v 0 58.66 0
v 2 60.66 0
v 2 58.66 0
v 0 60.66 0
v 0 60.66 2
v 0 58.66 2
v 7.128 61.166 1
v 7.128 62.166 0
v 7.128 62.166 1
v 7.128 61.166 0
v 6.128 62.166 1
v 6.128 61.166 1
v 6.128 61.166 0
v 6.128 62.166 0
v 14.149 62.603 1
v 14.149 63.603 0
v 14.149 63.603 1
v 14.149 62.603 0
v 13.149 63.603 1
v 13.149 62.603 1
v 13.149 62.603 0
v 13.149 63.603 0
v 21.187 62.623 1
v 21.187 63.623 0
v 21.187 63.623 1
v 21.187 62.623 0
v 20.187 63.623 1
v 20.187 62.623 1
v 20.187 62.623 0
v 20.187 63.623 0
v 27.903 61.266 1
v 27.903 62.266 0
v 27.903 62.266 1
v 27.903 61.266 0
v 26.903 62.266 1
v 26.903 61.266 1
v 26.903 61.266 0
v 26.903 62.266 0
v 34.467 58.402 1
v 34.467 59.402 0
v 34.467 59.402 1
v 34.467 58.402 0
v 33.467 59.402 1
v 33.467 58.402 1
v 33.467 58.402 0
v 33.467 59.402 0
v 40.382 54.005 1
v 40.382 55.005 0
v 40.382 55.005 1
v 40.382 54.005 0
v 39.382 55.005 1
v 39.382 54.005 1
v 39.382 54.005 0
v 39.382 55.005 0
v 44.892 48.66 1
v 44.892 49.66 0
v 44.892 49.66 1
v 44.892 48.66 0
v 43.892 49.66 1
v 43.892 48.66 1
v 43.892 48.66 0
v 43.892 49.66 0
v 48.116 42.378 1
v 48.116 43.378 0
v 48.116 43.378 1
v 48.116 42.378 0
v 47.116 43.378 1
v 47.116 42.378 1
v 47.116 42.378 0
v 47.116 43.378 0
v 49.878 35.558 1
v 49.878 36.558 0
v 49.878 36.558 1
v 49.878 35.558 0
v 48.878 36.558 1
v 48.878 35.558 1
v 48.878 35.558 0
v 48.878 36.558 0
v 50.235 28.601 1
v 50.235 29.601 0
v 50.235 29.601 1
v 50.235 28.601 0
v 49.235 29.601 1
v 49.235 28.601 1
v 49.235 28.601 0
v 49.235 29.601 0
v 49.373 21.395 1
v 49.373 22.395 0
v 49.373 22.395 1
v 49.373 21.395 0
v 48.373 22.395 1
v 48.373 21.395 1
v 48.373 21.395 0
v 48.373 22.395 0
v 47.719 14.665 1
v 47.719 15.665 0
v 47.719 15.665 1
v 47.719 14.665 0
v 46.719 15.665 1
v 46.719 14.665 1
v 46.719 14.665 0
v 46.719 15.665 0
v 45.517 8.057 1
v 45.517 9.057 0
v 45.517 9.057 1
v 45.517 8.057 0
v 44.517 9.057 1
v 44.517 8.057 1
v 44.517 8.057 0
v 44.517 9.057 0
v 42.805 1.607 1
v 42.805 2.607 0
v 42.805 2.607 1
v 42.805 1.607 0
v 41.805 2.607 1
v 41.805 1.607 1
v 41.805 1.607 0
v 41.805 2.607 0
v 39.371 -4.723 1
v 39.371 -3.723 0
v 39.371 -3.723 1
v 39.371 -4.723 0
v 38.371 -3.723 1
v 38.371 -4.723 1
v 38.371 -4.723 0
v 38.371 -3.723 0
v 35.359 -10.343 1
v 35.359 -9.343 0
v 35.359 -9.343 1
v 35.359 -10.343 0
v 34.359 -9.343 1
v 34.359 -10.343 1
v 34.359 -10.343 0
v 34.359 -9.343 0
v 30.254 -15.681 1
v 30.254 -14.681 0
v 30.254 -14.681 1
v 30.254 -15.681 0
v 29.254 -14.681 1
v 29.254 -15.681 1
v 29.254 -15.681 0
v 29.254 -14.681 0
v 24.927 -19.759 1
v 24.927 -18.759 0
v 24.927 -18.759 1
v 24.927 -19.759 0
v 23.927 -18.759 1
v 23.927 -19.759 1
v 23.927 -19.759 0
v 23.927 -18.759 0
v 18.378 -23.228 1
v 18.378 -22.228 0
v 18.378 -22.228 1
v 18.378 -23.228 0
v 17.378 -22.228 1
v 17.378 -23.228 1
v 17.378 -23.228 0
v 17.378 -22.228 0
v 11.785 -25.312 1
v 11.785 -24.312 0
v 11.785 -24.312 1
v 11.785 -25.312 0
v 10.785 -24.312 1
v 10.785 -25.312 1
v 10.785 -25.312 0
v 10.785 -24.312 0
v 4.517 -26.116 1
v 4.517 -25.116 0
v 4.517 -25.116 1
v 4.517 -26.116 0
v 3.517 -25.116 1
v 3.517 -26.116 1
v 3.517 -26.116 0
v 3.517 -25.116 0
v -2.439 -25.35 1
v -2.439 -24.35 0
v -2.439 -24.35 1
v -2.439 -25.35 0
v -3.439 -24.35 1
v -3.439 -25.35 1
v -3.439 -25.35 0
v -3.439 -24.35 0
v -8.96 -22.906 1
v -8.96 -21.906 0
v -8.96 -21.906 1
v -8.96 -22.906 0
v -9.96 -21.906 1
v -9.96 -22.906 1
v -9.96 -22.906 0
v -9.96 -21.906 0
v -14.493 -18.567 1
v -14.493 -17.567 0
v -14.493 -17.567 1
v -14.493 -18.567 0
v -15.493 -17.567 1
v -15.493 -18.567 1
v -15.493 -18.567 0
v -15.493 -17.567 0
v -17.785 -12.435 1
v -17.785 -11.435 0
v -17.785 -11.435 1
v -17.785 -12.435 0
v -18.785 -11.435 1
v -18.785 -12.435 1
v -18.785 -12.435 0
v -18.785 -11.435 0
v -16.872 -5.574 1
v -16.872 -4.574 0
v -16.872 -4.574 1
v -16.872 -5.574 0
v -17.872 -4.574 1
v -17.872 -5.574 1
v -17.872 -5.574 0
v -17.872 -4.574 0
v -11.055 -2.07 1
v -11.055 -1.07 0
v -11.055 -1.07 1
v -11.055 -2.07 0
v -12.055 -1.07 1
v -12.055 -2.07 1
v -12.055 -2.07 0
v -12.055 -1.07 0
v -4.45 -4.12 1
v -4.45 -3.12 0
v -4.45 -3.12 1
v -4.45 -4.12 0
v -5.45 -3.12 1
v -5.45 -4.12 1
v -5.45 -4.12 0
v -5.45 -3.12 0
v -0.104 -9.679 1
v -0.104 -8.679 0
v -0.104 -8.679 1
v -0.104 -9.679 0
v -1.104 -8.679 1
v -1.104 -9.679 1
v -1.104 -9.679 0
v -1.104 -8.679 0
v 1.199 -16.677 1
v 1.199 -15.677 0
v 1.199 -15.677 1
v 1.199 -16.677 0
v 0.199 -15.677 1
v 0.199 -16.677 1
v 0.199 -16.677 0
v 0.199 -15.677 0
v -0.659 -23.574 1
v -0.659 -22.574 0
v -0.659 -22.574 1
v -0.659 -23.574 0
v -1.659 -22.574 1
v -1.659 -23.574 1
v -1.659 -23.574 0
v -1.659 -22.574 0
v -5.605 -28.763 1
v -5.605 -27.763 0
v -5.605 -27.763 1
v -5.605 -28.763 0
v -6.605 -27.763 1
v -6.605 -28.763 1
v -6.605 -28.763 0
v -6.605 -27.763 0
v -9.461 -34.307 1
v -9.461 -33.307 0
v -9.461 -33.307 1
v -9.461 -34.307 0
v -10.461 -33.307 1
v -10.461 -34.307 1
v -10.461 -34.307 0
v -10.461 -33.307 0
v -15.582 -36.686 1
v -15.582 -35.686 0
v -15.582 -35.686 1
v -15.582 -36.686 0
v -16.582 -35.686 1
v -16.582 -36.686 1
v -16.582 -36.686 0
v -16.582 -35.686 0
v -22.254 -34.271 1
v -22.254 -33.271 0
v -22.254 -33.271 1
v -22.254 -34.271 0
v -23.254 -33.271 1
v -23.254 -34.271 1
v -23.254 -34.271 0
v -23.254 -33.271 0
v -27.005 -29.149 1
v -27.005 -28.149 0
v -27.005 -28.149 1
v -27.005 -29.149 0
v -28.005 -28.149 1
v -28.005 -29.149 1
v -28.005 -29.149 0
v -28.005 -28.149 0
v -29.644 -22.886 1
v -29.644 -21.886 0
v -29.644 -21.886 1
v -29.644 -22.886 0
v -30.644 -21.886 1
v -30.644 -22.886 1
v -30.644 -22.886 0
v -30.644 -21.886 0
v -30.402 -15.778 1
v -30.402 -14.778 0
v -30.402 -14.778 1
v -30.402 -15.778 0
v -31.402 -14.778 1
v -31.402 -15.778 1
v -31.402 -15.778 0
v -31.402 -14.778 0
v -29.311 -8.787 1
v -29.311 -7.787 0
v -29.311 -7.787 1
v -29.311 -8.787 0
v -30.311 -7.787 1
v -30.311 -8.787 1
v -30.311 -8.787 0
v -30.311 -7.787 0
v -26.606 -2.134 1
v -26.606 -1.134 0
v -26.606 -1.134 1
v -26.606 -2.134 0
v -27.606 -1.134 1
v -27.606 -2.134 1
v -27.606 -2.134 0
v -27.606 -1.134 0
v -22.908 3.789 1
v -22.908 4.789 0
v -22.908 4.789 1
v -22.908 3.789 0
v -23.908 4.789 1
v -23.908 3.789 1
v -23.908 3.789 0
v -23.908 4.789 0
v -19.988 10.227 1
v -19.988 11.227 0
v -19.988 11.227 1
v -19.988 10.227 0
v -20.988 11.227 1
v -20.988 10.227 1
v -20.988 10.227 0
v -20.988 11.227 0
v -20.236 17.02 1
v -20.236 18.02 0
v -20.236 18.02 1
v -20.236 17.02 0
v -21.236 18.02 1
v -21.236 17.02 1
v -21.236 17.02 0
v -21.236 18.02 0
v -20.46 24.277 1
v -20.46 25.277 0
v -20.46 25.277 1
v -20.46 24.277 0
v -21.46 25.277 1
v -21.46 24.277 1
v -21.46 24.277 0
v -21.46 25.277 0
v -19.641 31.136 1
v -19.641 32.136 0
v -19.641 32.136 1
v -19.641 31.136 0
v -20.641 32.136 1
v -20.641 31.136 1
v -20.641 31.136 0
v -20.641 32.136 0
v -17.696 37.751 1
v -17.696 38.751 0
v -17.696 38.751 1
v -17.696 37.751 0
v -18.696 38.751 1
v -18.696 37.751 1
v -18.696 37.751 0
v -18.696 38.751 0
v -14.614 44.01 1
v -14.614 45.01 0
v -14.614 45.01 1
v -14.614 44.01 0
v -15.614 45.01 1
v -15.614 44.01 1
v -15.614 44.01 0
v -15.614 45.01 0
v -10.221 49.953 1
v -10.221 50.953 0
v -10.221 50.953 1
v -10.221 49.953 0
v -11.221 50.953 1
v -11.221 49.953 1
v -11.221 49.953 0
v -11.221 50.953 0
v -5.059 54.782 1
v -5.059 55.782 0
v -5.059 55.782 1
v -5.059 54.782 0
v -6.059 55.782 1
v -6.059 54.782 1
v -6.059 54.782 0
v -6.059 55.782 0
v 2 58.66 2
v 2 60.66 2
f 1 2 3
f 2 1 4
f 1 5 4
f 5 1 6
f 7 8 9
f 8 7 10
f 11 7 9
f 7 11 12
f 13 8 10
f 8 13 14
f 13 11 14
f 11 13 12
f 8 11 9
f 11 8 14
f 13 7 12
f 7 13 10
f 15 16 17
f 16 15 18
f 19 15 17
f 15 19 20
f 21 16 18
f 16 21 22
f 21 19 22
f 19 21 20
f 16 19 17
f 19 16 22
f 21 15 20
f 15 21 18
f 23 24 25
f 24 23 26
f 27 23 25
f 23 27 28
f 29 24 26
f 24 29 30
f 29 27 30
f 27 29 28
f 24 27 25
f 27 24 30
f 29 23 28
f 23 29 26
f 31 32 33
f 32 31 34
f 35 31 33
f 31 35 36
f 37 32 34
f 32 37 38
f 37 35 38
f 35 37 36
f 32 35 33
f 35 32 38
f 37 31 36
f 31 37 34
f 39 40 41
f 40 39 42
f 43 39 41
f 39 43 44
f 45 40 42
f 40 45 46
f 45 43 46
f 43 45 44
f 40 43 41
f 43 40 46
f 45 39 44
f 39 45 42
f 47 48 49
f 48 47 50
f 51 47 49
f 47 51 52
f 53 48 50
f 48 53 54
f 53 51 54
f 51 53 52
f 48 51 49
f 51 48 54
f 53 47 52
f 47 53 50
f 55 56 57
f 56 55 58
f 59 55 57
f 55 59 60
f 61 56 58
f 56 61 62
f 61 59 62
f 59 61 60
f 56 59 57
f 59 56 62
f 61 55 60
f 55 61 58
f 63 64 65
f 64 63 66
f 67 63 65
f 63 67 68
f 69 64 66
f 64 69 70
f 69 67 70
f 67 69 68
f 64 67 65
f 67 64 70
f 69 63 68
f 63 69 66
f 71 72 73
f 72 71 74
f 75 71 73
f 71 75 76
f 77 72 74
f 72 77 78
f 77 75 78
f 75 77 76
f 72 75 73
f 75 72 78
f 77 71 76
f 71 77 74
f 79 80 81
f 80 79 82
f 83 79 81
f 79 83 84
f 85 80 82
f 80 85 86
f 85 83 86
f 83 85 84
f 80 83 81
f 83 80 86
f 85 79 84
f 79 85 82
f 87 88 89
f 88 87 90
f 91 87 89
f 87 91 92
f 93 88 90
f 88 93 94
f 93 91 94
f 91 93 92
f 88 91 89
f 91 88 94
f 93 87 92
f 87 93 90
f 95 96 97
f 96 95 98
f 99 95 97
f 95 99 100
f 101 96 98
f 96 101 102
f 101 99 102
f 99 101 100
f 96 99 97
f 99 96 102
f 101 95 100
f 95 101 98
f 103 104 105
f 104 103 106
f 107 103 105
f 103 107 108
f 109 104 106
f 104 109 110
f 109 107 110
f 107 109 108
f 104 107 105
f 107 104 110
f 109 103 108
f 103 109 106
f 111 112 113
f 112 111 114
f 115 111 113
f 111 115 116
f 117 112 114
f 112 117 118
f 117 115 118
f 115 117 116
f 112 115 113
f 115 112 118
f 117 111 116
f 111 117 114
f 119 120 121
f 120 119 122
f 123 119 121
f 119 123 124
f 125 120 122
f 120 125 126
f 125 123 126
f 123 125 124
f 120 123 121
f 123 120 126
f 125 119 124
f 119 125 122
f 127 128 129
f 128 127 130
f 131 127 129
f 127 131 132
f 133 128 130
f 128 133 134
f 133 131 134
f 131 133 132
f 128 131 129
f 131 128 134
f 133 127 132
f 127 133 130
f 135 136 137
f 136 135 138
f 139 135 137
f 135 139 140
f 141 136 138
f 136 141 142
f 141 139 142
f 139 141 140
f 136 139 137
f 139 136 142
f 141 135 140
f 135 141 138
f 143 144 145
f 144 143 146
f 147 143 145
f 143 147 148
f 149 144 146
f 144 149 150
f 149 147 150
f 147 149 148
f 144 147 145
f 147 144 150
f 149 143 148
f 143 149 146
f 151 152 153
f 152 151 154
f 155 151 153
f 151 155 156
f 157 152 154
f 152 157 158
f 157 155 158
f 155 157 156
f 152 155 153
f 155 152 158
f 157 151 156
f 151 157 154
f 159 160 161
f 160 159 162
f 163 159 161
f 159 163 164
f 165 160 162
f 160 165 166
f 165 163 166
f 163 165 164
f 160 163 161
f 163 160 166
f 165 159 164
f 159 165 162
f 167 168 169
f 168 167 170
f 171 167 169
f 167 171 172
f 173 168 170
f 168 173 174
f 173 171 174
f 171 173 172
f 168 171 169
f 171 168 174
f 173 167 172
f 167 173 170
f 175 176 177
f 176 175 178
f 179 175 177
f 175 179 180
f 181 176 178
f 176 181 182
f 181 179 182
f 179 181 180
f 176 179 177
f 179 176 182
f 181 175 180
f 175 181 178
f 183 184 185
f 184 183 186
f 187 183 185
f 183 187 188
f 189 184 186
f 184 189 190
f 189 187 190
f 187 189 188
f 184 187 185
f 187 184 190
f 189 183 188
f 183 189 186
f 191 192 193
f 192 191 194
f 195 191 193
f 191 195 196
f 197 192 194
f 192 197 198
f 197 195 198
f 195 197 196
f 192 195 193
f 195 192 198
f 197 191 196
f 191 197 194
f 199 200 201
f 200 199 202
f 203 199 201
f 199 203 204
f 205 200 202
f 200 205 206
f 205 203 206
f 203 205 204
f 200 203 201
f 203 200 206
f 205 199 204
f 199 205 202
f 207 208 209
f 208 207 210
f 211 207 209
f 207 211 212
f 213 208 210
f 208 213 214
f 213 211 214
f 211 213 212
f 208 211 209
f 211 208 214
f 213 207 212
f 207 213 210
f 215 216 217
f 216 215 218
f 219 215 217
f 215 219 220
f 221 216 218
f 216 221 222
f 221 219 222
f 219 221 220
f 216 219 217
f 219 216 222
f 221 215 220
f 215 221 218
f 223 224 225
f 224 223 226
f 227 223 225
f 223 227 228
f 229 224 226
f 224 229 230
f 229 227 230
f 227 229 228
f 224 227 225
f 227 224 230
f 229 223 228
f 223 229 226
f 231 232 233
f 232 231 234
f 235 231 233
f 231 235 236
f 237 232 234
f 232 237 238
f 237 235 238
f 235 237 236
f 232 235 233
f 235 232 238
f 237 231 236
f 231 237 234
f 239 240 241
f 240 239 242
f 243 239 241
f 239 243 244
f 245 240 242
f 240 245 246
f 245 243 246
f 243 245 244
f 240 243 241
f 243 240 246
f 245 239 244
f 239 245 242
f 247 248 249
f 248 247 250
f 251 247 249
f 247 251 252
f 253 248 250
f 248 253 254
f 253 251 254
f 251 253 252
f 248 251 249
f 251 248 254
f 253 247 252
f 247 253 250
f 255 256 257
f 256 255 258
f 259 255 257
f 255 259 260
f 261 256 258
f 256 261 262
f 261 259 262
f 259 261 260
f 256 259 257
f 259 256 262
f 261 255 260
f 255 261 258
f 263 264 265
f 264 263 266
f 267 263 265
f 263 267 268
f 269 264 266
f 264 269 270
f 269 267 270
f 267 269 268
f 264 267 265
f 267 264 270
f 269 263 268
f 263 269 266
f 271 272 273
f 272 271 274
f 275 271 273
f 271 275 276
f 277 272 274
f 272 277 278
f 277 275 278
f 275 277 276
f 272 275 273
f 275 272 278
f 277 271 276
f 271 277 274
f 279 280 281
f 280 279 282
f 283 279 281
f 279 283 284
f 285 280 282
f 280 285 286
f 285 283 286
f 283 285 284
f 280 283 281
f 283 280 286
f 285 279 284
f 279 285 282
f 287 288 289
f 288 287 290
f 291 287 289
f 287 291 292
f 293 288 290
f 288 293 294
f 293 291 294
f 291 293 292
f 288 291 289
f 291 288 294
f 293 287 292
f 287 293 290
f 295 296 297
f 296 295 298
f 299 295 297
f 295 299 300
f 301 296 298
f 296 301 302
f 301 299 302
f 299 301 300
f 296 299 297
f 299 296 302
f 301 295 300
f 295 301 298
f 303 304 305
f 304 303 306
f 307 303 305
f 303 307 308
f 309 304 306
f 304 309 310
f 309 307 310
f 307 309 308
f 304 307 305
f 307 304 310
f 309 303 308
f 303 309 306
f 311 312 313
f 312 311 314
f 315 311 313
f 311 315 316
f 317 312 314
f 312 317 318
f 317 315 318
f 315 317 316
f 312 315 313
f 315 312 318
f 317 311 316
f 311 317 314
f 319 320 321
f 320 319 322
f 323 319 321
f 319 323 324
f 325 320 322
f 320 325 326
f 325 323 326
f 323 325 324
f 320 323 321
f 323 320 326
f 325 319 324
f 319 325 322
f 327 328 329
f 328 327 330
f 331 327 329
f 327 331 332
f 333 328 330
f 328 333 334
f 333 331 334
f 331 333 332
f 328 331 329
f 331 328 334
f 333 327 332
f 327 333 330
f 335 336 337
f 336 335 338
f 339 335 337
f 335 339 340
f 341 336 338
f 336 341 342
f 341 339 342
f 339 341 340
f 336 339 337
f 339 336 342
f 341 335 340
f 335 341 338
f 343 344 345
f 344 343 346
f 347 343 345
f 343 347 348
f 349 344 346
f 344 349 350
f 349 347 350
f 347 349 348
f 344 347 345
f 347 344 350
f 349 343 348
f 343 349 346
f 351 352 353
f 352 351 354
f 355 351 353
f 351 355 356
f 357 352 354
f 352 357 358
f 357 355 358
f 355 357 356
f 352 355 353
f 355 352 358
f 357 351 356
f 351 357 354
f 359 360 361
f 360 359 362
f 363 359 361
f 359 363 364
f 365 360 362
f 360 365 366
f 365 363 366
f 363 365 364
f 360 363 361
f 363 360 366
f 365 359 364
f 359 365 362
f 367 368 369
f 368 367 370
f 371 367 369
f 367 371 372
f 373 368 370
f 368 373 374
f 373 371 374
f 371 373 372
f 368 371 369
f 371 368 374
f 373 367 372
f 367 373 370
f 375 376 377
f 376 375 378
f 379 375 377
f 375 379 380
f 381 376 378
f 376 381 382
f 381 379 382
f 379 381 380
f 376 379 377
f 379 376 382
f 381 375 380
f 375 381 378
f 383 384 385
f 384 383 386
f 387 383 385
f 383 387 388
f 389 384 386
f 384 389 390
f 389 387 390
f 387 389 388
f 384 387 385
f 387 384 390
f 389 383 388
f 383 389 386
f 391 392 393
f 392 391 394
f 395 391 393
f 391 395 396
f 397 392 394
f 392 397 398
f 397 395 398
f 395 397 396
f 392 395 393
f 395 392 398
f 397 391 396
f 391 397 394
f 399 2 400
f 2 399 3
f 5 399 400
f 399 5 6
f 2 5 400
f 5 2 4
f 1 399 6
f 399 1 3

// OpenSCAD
 
 
 
    g= [[0, 58.6603], [6.1281, 61.1664], [13.149, 62.6027], [20.1871, 62.6227], [26.9034, 61.2657], [33.4675, 58.4015], [39.3824, 54.0048], [43.892, 48.6604], [47.1155, 42.3784], [48.8782, 35.5582], [49.2346, 28.6012], [48.3733, 21.3949], [46.7195, 14.6647], [44.5169, 8.05707], [41.8054, 1.60724], [38.3714, -4.72287], [34.3593, -10.3432], [29.2536, -15.6812], [23.9266, -19.7588], [17.3785, -23.2277], [10.7848, -25.312], [3.51717, -26.1161], [-3.43924, -25.3497], [-9.96021, -22.906], [-15.4931, -18.5675], [-18.7851, -12.4352], [-17.8723, -5.57383], [-12.0549, -2.07008], [-5.4502, -4.12027], [-1.10404, -9.67876], [0.198684, -16.677], [-1.65937, -23.5744], [-6.60518, -28.7634], [-10.4611, -34.3071], [-16.5818, -36.6863], [-23.2544, -34.2714], [-28.005, -29.1488], [-30.6436, -22.8863], [-31.4023, -15.7784], [-30.3111, -8.78733], [-27.6058, -2.13372], [-23.9082, 3.78909], [-20.9881, 10.2272], [-21.2364, 17.0203], [-21.4605, 24.2768], [-20.6407, 31.1363], [-18.6961, 37.7511], [-15.6141, 44.0104], [-11.2207, 49.9529], [-6.05874, 54.782]];
      for(i=g)  translate(i)cube(1);
 
     p=path($t);

    translate(p)cube(2);
 

function pathlength(i,j,p=.5)=
let(p1=subpath(i))
let(p2=subpath(j))
let(k=lerp(i,j,0.5))
let(pm=subpath(k))
let(pp=lerp(p1,p2,0.5))
let(err=norm(pm-pp))
err<p?norm(p1-p2):
pathlength(i,k)+pathlength(k,j)

;

function path(i)= 
let(d=pathlength(0,ceil(i)))
let(p= pathpart(0,ceil(i),i,d))
subpath(p )
;

function pathpart(l,u,i,d)=
abs(u-l)<0.001?l:
let(m=lerp(l,u,0.5))
let(v=pathlength(0,m,0.1) )
 

v<d*i?
pathpart(m,u,i,d)
:
pathpart(l,m,i,d)
;


function  subpath(i)=   (
[sin(i*360),cos(i*360)]*30*(1+sin(i*360*2)*0.5)
+[sin(i*360*2),cos(i*360*2)]*20*(1+sin(60+i*360*3)*0.5)
//+[sin(i*360*12),cos(i*360*15)]*20
//+[sin(i*360*4),cos(i*360*4)]*25
 )   ;
 function lerp(start,end,bias) = (end * bias + start * (1 - bias));
